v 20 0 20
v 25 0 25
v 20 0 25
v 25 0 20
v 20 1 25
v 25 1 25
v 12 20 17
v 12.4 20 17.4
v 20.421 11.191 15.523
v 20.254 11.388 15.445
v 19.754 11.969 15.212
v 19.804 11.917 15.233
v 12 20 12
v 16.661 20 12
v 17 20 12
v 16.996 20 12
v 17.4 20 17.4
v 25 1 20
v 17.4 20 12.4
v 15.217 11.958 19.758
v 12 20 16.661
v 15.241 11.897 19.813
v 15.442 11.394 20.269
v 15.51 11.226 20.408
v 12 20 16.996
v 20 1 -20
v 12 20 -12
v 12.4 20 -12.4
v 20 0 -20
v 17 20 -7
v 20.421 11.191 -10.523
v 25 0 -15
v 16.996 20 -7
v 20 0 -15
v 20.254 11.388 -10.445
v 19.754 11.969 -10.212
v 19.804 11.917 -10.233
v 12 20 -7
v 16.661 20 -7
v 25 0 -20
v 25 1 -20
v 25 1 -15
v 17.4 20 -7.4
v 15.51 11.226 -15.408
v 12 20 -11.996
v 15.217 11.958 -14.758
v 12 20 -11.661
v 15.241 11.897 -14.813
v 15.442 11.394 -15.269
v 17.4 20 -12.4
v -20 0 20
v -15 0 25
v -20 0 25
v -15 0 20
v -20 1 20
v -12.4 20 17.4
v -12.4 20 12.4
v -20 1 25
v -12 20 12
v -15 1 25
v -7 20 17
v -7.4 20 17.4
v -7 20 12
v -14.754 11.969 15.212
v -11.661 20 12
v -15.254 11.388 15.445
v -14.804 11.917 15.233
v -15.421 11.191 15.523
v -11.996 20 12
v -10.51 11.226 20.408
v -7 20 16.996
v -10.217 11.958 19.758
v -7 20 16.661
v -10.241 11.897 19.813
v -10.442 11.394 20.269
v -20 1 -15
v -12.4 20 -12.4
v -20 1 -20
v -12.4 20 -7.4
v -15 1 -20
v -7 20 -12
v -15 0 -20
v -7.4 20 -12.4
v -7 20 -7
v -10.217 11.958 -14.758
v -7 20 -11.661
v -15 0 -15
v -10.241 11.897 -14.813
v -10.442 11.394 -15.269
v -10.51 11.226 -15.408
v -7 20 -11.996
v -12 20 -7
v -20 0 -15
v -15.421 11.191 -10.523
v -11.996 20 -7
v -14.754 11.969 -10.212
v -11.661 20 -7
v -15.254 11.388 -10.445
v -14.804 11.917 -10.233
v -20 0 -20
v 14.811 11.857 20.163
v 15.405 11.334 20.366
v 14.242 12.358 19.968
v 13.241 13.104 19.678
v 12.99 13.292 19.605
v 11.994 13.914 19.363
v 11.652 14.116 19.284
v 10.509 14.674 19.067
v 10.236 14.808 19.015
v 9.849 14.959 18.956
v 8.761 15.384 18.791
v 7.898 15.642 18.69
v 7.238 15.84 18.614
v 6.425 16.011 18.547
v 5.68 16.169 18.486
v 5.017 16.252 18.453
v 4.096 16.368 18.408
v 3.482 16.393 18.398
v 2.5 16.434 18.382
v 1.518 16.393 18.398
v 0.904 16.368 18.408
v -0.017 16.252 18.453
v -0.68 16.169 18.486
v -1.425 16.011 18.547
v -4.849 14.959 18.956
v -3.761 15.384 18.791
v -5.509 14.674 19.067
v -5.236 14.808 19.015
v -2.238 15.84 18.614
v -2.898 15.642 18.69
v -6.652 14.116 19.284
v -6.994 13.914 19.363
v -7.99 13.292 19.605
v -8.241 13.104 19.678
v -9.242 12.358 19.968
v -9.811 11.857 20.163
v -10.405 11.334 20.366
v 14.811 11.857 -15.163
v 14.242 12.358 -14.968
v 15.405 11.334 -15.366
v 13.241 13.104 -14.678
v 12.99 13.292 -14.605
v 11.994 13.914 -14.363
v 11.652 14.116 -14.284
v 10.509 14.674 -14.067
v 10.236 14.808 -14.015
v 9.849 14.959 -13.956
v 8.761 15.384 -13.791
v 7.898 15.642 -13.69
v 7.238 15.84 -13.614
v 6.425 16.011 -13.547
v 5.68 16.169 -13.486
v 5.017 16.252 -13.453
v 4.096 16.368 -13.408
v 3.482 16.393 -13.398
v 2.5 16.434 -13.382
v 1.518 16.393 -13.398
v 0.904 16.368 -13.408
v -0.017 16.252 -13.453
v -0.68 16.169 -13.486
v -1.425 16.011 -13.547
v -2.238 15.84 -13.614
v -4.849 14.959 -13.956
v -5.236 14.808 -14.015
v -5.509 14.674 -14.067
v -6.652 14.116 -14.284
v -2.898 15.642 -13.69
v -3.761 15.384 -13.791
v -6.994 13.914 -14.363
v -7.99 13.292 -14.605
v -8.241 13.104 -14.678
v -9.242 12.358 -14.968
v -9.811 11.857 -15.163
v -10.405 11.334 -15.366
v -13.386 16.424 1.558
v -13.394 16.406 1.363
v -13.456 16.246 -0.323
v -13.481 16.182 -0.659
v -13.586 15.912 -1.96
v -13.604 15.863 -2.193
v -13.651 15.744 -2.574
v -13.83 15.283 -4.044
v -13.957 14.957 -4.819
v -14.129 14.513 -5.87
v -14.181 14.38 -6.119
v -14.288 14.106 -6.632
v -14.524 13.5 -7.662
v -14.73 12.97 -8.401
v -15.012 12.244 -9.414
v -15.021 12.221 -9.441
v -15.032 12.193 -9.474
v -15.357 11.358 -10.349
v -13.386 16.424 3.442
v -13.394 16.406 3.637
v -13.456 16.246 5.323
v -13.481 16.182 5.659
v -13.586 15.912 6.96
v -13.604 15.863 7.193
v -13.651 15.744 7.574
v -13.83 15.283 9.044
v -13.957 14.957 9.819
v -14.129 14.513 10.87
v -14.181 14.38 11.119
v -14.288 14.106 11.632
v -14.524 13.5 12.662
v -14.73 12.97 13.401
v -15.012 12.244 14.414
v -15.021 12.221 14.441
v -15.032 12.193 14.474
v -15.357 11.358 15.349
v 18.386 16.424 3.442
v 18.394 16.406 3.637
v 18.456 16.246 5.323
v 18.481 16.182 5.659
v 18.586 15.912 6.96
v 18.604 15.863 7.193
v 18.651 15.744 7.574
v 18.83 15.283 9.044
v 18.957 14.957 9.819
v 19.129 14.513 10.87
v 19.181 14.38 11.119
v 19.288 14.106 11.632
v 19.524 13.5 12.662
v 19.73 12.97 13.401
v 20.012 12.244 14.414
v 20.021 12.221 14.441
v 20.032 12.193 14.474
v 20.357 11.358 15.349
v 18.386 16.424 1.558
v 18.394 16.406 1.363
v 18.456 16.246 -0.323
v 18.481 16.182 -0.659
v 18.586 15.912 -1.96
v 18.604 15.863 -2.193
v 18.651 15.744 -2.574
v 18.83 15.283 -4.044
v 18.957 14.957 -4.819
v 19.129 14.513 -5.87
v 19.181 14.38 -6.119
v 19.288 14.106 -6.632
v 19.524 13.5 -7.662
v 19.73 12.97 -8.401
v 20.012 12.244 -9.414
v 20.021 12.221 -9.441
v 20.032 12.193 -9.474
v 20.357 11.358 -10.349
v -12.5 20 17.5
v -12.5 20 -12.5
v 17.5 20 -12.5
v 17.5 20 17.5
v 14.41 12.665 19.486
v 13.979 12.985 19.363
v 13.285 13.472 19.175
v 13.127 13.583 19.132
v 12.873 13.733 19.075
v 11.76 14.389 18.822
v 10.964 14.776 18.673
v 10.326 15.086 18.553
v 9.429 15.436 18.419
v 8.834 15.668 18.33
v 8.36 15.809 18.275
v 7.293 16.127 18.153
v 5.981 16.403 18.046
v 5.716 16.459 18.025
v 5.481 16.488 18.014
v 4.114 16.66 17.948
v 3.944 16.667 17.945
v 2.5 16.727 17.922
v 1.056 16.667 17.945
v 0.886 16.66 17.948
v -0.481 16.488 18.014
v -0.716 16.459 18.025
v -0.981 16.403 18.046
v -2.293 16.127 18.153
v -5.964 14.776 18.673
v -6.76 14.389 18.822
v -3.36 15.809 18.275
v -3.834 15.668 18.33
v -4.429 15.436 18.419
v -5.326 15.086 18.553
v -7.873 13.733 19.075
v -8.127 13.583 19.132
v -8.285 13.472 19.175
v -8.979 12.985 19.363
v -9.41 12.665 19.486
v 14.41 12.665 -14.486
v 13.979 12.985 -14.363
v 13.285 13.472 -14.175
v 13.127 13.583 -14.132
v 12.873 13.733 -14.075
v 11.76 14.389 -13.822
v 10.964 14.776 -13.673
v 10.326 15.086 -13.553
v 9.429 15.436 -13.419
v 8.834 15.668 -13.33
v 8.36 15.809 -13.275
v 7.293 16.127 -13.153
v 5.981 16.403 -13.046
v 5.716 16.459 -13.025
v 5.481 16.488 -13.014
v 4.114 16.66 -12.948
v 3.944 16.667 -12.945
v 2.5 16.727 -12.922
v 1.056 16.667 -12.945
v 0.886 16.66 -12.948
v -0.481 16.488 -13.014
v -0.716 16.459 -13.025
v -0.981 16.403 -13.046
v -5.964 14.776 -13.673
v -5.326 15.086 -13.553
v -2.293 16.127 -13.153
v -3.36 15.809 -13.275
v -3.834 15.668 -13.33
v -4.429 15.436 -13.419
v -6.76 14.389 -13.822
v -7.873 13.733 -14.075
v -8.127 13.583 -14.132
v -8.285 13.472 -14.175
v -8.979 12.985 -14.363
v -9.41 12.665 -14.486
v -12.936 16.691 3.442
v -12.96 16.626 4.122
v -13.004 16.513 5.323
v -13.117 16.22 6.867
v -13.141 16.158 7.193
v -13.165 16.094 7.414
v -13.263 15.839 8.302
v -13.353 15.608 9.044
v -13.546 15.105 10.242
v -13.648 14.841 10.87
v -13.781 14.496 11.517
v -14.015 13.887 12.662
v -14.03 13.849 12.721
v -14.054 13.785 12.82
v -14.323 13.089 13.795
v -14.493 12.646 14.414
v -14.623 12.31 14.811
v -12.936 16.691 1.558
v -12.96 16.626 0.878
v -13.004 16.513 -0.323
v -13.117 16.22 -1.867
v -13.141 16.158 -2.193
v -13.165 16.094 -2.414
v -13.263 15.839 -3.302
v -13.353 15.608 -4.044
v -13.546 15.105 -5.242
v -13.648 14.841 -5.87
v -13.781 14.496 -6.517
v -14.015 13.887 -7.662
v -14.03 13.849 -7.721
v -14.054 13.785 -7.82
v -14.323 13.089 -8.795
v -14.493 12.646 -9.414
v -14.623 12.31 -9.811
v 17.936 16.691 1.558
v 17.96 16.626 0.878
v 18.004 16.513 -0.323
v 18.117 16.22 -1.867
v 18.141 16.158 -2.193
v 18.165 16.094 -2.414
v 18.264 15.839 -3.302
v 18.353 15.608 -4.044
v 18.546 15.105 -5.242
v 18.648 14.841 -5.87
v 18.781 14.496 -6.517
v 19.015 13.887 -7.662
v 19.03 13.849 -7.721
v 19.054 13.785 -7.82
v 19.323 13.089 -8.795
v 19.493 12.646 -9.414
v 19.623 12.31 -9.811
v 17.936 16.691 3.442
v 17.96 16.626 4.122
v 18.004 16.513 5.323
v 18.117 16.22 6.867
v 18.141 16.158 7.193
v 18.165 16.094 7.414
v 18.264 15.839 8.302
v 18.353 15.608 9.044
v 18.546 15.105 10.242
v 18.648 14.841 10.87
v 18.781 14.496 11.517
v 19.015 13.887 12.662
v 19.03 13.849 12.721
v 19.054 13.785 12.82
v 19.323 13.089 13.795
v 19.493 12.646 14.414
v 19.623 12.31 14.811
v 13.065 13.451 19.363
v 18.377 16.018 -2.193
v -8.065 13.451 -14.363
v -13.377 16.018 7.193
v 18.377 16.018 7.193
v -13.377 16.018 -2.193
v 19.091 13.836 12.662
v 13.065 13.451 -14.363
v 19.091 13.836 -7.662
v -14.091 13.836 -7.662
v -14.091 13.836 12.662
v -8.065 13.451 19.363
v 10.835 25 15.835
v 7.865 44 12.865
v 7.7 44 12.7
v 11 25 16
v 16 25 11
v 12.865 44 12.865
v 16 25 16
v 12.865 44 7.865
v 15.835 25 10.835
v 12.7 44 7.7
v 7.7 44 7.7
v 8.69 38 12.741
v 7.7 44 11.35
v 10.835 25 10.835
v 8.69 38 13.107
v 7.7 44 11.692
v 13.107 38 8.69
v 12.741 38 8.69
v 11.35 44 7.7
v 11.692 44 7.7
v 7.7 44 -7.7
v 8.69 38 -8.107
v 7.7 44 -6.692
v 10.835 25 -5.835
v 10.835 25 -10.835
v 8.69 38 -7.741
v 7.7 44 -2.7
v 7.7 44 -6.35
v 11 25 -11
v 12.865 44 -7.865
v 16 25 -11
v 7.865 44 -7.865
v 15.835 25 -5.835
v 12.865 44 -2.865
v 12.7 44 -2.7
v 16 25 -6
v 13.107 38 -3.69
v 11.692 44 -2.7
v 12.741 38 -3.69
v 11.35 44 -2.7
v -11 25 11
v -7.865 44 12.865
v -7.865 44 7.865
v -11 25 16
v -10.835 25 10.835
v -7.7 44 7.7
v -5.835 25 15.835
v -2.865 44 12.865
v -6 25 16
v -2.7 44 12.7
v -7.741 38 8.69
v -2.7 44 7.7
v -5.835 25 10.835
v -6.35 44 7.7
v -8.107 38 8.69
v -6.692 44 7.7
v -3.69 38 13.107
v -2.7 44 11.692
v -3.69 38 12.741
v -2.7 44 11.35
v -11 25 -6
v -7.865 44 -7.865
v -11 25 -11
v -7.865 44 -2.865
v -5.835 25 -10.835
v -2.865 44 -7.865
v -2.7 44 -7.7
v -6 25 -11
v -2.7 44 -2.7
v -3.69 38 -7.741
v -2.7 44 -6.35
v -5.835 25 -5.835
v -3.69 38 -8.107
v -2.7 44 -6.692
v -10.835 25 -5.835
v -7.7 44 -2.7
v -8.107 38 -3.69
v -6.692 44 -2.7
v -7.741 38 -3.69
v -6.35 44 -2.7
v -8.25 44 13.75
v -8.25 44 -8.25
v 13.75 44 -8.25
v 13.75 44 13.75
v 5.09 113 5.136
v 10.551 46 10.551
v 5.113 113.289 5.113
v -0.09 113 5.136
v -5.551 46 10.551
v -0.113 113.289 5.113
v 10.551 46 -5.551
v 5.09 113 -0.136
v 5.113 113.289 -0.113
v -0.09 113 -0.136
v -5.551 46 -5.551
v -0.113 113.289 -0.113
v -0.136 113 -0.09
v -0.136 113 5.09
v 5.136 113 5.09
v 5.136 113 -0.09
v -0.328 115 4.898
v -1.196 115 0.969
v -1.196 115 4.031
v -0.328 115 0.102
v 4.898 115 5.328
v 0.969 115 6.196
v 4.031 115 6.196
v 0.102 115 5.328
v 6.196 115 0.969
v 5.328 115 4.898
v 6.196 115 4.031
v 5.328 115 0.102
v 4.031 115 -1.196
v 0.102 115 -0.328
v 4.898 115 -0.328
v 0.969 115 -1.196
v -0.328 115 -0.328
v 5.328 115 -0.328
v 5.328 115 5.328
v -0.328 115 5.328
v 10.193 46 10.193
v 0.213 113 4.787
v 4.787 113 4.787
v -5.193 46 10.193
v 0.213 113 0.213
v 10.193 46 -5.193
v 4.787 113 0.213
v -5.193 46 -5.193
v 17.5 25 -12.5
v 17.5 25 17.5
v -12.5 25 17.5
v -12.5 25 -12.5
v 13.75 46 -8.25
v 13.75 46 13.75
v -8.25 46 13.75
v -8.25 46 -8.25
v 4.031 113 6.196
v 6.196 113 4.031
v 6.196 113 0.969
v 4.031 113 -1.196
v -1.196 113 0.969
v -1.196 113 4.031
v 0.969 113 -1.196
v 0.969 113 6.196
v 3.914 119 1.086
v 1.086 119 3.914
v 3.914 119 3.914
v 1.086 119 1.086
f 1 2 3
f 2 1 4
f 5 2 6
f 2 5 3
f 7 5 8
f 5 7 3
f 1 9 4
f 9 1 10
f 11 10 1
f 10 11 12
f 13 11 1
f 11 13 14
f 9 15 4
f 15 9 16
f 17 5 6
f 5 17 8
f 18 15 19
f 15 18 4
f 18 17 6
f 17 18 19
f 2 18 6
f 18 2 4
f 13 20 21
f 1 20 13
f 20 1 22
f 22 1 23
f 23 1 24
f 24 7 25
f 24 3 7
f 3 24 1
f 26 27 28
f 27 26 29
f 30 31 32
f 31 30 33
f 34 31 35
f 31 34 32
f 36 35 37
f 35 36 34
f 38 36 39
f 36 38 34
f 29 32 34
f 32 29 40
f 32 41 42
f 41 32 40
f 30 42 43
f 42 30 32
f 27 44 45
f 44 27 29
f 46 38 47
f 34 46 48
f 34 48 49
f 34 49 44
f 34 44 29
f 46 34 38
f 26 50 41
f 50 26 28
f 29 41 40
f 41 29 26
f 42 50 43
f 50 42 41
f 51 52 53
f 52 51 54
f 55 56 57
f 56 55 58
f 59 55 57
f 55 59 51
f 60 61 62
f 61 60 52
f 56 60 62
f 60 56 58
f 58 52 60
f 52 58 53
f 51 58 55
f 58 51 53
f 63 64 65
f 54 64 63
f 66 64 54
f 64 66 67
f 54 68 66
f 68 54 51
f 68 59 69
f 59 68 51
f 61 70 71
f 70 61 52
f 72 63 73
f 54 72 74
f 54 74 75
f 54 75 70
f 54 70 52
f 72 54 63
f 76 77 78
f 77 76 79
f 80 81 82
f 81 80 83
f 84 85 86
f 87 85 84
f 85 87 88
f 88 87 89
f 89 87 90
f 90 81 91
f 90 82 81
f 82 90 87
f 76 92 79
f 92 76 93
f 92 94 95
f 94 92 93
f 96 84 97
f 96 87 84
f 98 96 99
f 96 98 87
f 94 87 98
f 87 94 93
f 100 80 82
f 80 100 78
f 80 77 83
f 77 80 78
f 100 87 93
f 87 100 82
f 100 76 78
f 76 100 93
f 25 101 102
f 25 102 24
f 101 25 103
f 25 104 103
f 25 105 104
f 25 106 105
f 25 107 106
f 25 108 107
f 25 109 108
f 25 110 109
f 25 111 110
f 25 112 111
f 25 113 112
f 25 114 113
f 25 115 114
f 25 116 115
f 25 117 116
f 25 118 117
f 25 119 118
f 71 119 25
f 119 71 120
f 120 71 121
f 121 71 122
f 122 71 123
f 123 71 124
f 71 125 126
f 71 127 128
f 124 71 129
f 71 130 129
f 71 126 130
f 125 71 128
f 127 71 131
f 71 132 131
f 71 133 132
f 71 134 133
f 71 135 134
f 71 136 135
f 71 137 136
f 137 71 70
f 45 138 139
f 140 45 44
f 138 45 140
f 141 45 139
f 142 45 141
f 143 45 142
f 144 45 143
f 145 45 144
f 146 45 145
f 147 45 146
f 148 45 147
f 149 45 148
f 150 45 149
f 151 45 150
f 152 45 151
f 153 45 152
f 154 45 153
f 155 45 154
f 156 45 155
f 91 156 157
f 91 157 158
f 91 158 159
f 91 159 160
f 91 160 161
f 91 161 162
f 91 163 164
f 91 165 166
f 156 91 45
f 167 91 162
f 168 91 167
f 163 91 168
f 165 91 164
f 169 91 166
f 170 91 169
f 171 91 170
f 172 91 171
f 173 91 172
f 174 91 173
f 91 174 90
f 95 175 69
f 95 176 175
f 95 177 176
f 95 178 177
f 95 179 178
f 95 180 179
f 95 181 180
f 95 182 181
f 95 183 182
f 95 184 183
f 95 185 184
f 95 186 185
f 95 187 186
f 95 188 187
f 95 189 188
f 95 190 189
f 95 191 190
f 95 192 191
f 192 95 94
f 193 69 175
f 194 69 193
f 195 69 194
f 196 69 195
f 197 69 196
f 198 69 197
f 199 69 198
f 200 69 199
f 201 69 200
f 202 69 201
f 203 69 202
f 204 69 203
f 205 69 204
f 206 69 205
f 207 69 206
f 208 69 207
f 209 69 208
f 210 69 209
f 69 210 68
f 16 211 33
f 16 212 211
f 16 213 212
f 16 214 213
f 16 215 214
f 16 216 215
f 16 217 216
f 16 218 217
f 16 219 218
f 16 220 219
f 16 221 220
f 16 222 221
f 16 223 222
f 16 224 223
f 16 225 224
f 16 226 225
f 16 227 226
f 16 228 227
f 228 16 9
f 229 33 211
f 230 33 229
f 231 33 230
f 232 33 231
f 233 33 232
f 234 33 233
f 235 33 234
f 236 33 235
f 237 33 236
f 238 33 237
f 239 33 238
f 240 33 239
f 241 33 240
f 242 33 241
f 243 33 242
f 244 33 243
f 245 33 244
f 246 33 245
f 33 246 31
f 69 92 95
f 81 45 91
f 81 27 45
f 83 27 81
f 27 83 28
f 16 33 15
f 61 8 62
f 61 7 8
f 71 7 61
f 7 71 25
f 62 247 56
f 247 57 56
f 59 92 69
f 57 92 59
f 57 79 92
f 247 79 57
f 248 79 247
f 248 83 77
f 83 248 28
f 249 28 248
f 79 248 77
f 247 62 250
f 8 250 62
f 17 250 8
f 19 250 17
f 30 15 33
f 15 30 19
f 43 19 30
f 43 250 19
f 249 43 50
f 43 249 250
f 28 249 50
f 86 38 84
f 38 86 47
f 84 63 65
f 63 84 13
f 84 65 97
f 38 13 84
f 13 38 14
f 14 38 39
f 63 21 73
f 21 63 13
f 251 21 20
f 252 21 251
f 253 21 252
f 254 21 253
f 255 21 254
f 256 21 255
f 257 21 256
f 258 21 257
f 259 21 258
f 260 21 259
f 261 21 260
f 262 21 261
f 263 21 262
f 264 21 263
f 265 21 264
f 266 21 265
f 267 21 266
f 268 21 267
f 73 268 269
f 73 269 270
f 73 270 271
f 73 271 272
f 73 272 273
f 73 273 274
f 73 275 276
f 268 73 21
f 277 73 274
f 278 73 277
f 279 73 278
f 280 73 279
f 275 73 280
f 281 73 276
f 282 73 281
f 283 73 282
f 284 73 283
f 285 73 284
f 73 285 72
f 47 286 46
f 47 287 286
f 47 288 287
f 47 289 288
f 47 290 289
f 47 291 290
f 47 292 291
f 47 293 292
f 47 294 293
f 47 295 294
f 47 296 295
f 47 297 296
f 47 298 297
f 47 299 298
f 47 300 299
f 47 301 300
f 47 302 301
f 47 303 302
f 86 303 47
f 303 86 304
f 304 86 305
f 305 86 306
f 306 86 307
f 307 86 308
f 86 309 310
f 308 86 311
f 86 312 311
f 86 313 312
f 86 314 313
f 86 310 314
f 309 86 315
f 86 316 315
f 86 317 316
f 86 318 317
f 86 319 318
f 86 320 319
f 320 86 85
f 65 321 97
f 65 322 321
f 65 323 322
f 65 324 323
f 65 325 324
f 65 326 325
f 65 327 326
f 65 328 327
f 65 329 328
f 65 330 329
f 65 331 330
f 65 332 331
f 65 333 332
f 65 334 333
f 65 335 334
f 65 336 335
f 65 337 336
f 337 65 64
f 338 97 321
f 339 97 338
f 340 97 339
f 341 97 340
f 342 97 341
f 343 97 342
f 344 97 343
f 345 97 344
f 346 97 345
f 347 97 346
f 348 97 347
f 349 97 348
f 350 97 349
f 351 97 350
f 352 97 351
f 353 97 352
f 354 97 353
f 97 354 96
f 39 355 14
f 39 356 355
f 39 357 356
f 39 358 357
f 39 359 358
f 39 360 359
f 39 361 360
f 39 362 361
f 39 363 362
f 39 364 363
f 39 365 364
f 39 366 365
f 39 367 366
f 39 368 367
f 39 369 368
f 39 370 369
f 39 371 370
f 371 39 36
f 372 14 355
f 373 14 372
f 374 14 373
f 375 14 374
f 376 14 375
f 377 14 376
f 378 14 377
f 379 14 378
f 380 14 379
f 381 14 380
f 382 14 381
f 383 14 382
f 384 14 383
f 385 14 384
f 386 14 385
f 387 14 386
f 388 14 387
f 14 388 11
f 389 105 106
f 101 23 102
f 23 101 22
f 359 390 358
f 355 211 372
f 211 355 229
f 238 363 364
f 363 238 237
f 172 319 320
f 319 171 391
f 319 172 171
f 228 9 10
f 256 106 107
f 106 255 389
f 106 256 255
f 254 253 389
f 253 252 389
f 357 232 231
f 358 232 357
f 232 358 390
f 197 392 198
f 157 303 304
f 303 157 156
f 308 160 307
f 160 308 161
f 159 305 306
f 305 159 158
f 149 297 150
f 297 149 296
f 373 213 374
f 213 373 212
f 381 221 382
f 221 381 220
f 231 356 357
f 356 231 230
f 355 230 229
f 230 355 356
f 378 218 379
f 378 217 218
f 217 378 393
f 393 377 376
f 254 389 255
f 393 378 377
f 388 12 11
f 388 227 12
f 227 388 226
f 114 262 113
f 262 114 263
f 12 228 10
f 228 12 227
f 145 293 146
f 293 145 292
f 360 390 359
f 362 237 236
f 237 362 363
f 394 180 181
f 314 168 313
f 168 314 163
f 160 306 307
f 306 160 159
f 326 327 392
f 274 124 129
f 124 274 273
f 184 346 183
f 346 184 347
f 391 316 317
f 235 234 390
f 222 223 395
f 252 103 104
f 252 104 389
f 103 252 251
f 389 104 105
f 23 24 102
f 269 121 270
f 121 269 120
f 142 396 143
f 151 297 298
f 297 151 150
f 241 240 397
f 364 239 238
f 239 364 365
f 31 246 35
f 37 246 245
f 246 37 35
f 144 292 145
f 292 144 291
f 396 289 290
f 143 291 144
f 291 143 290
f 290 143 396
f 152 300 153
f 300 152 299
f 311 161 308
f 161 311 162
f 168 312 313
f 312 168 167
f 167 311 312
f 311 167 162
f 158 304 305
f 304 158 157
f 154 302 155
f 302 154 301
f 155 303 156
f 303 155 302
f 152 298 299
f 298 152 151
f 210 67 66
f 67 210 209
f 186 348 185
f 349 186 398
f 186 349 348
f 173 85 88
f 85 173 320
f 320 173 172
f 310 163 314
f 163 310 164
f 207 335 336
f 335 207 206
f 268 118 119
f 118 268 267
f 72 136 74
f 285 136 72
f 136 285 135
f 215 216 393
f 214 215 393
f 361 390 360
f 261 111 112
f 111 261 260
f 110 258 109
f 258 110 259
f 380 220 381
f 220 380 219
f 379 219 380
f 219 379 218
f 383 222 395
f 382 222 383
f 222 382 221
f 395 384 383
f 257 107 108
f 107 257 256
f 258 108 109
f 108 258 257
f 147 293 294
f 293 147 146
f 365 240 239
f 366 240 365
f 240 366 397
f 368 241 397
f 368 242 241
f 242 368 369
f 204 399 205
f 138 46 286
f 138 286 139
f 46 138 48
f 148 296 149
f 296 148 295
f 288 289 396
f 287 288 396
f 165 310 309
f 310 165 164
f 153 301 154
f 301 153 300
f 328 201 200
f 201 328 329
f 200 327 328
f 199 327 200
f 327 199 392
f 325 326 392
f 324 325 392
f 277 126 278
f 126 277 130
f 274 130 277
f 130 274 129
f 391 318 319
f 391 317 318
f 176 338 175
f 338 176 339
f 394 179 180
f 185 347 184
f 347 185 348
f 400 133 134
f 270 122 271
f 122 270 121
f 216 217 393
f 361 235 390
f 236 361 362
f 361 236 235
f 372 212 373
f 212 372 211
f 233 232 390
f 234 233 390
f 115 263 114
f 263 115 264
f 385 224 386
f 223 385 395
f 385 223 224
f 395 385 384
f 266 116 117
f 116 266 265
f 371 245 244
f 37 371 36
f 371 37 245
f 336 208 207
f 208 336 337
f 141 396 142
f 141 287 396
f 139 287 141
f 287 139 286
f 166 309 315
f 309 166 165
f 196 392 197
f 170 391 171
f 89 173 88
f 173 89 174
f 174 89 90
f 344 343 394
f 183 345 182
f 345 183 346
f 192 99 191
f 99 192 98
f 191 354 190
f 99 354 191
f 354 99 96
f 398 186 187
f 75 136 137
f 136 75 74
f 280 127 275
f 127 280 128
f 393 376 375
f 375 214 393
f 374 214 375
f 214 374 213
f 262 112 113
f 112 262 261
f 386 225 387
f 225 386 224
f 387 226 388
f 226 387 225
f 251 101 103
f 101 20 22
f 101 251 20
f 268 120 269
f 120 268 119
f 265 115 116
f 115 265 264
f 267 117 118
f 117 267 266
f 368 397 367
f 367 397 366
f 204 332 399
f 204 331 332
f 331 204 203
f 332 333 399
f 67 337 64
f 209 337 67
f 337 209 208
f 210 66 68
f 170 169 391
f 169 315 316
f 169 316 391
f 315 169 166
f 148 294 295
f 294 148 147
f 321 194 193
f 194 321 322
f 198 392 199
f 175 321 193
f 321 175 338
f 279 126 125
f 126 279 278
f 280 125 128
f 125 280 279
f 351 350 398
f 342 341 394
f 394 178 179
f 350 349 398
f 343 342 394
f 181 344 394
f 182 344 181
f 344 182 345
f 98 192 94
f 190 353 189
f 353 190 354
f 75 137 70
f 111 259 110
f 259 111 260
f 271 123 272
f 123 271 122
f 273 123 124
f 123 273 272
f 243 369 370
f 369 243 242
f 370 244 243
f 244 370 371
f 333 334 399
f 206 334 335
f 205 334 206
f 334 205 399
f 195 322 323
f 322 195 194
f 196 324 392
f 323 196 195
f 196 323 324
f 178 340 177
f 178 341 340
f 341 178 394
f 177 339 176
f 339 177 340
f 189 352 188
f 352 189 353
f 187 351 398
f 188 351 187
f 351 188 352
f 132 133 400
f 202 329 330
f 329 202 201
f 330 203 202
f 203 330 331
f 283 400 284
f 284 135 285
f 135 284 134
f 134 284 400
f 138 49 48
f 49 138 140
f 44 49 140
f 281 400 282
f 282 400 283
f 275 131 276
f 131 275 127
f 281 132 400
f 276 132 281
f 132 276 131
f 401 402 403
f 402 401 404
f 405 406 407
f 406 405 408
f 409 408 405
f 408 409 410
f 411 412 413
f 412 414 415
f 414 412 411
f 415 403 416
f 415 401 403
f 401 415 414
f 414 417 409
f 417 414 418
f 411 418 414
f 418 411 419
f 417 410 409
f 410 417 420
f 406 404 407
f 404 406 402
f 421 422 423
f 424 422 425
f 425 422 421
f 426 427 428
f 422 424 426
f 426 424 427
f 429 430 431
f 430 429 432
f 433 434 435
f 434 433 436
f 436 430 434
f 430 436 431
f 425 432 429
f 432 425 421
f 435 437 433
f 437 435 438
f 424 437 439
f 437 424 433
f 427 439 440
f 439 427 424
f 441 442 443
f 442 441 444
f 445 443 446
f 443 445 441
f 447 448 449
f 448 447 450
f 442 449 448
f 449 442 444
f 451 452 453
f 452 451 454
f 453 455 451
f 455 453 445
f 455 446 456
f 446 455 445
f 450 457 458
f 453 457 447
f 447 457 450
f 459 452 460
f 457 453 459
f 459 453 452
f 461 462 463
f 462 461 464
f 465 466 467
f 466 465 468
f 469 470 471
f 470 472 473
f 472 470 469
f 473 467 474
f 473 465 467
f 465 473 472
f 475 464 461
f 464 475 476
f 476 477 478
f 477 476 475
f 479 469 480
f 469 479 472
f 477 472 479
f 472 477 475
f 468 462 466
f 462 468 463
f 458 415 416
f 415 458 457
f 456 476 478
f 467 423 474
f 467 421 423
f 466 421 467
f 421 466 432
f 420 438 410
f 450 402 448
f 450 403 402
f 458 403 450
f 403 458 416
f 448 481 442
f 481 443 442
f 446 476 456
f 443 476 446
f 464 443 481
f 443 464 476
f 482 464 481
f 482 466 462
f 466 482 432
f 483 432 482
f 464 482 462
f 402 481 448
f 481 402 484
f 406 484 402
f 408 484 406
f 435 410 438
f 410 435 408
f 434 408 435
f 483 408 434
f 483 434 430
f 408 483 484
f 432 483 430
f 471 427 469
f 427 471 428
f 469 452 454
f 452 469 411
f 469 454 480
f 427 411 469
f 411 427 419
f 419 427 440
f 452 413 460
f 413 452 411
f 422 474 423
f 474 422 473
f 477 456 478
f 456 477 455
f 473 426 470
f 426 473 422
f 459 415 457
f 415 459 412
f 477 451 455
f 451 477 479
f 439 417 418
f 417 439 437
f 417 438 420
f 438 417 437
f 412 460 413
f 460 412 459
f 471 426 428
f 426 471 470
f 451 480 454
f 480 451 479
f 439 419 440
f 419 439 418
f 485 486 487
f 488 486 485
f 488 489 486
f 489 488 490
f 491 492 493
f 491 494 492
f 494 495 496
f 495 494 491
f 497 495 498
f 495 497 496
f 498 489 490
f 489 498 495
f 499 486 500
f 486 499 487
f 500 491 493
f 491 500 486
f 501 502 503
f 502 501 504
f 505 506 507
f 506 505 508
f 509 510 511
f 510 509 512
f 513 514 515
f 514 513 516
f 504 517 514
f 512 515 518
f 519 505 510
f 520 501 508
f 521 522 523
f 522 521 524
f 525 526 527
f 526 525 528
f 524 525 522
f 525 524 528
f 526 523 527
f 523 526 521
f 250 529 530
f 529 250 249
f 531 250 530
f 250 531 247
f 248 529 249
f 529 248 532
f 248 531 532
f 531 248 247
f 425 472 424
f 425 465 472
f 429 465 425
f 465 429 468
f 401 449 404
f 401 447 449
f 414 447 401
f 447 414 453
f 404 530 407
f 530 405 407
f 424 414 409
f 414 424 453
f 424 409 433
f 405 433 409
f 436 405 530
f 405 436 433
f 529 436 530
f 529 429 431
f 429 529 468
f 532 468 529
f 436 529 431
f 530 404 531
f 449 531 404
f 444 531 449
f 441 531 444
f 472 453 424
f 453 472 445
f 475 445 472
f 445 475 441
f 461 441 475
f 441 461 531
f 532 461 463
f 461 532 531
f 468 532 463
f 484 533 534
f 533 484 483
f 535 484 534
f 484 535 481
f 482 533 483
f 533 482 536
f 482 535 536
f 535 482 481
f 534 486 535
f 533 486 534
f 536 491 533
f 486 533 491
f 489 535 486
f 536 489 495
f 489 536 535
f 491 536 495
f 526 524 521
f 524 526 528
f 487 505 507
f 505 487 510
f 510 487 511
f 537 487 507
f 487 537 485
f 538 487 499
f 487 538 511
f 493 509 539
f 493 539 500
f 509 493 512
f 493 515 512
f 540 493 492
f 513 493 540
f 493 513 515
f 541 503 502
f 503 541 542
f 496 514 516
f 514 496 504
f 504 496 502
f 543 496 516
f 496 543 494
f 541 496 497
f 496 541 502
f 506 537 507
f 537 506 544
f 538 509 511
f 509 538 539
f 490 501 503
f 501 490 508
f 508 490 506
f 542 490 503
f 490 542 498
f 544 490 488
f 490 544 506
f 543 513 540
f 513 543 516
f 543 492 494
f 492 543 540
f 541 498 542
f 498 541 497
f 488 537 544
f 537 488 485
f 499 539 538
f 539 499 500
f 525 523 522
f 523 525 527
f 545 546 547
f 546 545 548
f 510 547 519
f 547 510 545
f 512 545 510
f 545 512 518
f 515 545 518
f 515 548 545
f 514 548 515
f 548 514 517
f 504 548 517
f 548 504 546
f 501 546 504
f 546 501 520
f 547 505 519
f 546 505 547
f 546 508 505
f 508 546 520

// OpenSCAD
$leg=20;
$w = 5;
$inshift = -0.4;
$minshift = -0.3;
$mleg=11;

//lower legs
for(x=[$leg,-$leg]){
    for(y=[$leg,-$leg]){
        translate([x,0,y])
        hull(){
            translate([$inshift*x, $leg, $inshift*y])
                cube([$w,1,$w]);
            cube([$w,1,$w]);
        }
    }
}

//lower platform
translate([-.5*($leg+$w), $leg, -.5*($leg+$w)])
    cube([1.5*$leg, 5, 1.5*$leg]);

//lower platform arch
difference(){
translate([.5*$w,15,.5*$w]) rotate([-90,45,0])
    hollow_cone(4,51,40,10,1);
translate([.5*$w,-9,.5*$w])
    sphere(30,$fn=100);
}


//middle legs
for(x=[$mleg,-$mleg]){
    for(y=[$mleg,-$mleg]){
        translate([x,24,y])
        hull(){
            translate([$minshift*x, $leg, $minshift*y])
                cube([$w,1,$w]);
            cube([$w,1,$w]);
        }
    }
}

//middle platform
translate([-0.75*($mleg), 2*($leg)+$w-1, -0.75*($mleg)])
    cube([2*$mleg, 2, 2*$mleg]);

//middle platform frame
translate([.5*$w,41,.5*$w]) rotate([-90,45,0])
    hollow_cone(4,29,25,6,1);

//upper tower
translate([.5*$w,80,.5*$w]) rotate([-90,45,0])
    hollow_cone(4,22,6,70,1);

//viewing platform
translate([2.5,115,2.5]) rotate([90,22.5,0])
    cylinder(h=2,r=4,$fn=8);
translate([2.5,119,2.5]) rotate([90,45,0])
    cylinder(h=4,r1=2,r2=4,$fn=4);

module hollow_cone(sides,bottom_diameter,top_diameter,height,wall){
difference(){
cylinder(d1=bottom_diameter+wall,d2=top_diameter+wall,h=height,$fn=sides,center=true);
cylinder(d1=bottom_diameter,d2=top_diameter,h=height+.1,$fn=sides,center=true);
}
}
